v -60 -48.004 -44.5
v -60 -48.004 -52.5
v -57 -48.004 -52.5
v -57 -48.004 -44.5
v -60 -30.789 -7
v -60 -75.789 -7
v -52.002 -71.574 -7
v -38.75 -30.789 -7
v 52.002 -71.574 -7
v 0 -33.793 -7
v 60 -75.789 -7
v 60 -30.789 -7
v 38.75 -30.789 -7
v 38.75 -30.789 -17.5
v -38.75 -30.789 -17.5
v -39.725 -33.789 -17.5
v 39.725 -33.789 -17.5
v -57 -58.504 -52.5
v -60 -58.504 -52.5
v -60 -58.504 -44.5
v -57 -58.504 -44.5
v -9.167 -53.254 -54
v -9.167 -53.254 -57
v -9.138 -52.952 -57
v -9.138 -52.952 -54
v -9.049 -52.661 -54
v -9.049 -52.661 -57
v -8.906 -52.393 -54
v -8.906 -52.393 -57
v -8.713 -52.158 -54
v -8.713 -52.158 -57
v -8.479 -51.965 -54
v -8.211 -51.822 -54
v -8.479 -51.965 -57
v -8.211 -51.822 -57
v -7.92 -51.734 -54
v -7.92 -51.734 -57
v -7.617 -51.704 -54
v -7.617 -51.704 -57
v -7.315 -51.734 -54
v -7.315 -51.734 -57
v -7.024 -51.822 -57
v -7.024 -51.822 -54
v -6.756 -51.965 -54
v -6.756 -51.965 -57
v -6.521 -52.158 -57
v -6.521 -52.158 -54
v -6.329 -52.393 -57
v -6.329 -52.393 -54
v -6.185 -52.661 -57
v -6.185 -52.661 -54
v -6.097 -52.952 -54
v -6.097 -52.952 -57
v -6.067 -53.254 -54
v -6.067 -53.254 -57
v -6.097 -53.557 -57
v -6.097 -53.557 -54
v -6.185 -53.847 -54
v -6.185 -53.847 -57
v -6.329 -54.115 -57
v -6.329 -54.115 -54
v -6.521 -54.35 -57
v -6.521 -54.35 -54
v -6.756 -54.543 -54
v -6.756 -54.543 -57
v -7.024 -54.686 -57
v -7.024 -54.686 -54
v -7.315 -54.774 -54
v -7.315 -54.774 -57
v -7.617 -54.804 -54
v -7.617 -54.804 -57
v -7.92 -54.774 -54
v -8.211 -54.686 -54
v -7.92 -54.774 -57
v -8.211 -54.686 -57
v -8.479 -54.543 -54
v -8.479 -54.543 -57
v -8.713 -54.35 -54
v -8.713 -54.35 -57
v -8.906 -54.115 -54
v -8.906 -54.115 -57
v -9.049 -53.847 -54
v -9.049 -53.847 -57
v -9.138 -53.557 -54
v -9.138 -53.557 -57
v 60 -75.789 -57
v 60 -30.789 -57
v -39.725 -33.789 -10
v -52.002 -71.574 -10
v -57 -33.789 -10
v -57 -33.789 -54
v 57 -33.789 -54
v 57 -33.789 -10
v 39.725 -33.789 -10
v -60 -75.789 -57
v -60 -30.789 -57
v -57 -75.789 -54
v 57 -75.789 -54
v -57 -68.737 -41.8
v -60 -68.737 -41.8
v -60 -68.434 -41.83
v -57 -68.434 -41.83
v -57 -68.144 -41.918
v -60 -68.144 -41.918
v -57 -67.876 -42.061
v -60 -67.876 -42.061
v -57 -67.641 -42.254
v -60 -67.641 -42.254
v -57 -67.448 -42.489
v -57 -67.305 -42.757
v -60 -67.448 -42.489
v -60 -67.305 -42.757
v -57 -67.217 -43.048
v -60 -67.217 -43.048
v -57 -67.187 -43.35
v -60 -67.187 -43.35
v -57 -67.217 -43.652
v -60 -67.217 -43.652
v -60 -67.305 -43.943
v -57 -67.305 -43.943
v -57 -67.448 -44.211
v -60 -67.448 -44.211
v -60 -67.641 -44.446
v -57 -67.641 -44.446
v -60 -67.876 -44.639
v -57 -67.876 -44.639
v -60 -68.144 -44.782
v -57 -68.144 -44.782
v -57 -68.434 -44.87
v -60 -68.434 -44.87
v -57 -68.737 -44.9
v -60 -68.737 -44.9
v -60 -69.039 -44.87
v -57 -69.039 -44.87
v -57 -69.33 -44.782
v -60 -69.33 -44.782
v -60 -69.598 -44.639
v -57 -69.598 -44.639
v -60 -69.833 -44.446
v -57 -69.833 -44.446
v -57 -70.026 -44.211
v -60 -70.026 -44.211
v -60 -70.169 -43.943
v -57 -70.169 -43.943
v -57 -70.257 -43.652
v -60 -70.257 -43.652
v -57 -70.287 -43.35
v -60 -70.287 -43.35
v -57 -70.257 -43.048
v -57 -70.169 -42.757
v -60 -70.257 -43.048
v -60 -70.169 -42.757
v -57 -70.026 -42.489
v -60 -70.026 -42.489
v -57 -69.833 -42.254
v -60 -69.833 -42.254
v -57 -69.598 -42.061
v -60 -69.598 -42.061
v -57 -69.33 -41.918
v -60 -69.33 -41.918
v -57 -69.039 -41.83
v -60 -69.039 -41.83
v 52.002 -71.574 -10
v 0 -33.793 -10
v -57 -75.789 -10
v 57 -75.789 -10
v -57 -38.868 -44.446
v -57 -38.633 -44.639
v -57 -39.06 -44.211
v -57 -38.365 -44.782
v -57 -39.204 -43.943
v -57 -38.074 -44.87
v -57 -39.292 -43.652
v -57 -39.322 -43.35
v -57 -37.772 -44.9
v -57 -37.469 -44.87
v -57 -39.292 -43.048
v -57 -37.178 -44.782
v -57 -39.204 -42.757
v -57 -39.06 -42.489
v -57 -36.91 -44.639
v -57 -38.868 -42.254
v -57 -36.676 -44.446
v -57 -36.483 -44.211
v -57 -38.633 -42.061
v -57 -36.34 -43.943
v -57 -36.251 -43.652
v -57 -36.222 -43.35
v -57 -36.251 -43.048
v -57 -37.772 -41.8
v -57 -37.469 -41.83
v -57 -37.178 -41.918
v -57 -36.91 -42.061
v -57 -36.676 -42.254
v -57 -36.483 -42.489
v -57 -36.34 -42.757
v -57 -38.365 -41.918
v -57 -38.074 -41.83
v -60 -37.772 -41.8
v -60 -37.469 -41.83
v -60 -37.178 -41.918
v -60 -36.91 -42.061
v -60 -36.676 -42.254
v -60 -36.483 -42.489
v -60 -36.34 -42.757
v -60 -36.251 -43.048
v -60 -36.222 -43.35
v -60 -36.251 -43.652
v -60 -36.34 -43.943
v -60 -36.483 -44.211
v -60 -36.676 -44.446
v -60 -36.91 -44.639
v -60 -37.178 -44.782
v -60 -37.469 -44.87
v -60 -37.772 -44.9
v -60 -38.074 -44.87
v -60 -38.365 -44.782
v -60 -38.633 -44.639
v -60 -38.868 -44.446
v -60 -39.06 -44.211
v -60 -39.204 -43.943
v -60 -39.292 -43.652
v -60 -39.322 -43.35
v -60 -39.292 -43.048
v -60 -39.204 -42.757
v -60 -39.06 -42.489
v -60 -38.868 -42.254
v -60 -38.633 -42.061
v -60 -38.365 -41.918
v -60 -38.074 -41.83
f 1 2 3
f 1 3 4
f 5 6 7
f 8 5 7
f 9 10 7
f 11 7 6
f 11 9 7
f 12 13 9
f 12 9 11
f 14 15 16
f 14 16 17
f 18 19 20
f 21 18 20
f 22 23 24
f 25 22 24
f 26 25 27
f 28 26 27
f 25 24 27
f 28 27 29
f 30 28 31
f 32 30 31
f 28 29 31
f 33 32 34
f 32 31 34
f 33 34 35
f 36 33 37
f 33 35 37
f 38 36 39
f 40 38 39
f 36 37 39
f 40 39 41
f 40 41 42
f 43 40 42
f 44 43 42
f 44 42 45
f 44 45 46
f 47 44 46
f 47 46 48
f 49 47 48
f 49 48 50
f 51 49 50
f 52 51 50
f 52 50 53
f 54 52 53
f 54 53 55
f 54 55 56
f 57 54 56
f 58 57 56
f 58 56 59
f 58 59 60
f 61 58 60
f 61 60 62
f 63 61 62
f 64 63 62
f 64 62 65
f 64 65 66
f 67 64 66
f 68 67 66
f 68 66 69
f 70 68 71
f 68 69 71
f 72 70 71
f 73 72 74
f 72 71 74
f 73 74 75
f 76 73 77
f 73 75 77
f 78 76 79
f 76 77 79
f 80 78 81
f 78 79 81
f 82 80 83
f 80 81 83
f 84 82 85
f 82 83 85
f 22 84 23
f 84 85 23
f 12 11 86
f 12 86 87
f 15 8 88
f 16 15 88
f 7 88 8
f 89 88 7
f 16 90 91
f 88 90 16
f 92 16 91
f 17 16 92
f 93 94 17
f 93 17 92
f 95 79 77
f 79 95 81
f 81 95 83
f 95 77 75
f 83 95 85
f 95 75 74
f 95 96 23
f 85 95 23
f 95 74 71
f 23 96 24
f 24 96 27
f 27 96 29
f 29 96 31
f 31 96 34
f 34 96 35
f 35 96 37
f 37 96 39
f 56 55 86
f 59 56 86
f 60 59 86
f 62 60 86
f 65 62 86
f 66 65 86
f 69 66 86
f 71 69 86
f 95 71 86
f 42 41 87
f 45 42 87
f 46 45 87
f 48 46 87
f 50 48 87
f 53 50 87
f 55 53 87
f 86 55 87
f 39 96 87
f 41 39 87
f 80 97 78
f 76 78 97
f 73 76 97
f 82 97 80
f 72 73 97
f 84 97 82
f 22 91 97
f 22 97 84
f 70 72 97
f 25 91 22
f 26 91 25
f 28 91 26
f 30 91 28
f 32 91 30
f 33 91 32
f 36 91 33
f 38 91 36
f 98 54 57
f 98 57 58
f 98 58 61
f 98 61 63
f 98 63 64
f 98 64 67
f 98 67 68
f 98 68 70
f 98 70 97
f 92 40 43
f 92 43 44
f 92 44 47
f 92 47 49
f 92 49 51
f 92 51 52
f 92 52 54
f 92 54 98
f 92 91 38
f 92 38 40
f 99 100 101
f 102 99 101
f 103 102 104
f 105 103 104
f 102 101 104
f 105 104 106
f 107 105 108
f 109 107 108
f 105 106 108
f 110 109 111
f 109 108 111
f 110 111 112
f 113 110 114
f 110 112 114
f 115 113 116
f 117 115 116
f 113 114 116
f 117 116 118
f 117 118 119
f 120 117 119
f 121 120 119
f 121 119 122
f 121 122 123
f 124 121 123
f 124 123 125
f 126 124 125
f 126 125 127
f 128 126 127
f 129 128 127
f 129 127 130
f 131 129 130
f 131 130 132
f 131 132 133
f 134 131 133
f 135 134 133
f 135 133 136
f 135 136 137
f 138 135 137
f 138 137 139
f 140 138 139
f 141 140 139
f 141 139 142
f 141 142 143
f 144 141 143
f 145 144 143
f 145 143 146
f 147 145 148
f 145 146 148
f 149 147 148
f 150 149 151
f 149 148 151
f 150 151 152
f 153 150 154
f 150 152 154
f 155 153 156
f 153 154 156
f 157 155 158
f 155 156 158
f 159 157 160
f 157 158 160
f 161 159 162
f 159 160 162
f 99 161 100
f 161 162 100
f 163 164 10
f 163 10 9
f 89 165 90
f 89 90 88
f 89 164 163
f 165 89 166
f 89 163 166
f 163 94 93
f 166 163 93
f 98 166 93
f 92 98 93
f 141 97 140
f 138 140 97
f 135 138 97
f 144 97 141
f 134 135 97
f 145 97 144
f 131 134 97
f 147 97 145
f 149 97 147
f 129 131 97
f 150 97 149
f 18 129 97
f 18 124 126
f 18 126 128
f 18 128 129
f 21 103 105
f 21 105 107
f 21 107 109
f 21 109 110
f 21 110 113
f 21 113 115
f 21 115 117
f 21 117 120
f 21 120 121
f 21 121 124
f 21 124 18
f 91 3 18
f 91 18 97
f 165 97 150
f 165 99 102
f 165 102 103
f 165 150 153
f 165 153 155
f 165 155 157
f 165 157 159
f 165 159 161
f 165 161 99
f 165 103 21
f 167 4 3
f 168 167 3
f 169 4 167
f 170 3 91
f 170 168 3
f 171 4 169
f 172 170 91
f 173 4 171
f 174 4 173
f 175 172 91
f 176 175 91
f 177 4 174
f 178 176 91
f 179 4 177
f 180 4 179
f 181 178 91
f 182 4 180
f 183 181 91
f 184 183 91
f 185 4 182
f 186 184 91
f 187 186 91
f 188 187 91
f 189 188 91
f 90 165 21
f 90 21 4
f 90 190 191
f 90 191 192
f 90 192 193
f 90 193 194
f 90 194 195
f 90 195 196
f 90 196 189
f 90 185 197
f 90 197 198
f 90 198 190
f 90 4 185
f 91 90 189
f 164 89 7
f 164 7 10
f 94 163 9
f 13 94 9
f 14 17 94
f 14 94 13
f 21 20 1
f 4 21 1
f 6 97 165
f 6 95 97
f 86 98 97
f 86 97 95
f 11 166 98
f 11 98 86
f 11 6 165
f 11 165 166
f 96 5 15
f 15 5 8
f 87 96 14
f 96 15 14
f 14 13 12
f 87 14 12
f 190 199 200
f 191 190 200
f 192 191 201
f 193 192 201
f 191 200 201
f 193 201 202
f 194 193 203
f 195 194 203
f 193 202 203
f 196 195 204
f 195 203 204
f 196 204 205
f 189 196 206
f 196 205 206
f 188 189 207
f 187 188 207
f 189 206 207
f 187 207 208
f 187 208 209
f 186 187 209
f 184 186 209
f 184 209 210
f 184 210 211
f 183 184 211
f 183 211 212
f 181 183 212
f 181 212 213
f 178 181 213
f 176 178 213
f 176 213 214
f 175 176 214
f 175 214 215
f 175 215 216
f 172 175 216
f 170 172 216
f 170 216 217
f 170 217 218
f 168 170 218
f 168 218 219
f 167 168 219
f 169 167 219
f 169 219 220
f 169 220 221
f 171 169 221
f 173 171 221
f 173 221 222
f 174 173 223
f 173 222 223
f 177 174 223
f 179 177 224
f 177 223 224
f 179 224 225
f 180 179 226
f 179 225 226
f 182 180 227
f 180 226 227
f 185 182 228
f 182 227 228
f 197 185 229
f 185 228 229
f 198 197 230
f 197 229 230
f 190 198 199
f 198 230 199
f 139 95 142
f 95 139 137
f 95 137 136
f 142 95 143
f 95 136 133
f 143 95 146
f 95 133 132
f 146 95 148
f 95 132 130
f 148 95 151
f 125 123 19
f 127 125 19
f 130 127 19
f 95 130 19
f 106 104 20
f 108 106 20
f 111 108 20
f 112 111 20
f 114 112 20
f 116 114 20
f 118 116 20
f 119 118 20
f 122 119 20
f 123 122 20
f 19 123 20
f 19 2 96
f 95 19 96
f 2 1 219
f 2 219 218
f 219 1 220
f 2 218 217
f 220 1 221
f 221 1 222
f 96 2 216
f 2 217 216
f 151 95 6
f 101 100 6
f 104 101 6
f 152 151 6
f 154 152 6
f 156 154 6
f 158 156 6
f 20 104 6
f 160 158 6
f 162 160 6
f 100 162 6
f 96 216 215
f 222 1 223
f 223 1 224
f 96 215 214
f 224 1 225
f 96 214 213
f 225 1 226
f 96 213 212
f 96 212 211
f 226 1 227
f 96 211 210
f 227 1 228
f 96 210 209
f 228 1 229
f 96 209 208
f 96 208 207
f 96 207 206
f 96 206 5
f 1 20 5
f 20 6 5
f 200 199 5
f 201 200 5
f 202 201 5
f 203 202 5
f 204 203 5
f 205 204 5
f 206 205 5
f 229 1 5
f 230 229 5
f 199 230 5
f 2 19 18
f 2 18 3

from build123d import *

# Parameters (mm, degrees)
CROQUIS2_W                   = 120
CROQUIS2_H                   = 45
SALIENTE_EXTRUIR1_DEPTH      = 5
SALIENTE_EXTRUIR1_DEPTH_BACK = 45
VACIADO1_T                   = -3
CORTAR_EXTRUIR2_START        = -10.5
CORTAR_EXTRUIR2_DEPTH        = 10.5
CORTAR_EXTRUIR3_REACH        = 122
CROQUIS4_R                   = 1.55
CROQUIS4_W                   = 8
CROQUIS4_H                   = 10.5
CORTAR_EXTRUIR4_REACH        = 52
CROQUIS5_R                   = 1.55


with BuildPart() as part:
    # Croquis2 → Saliente-Extruir1 (new body, two sides)
    with BuildSketch(Plane.XY.offset(-12)) as saliente_extruir1_sk:
        with Locations((0, -53.288987008)):
            Rectangle(CROQUIS2_W, CROQUIS2_H)
    extrude(amount=SALIENTE_EXTRUIR1_DEPTH)
    extrude(saliente_extruir1_sk.sketch, amount=-SALIENTE_EXTRUIR1_DEPTH_BACK)

    # Vaciado1
    vaciado1_openings = [part.faces().sort_by_distance(p)[0] for p in [
        (0, -75.788987008, -32),
    ]]
    offset(amount=VACIADO1_T, openings=vaciado1_openings, kind=Kind.INTERSECTION)

    # Croquis3 → Cortar-Extruir2 (cut)
    with BuildSketch(Plane.XY.offset(-7).offset(CORTAR_EXTRUIR2_START)):
        Polygon((0, 88.470820393), (-19.862936734, 27.338987008), (-84.140750237, 27.338987008), (-32.138906752, -10.442563819), (-52.001843485, -71.574397204), (0, -33.792846378), (52.001843485, -71.574397204), (32.138906752, -10.442563819), (84.140750237, 27.338987008), (19.862936734, 27.338987008), align=None)
    extrude(amount=CORTAR_EXTRUIR2_DEPTH, mode=Mode.SUBTRACT)

    # Croquis4 → Cortar-Extruir3 (cut, up to next)
    with BuildSketch(Plane.ZY.offset(60), mode=Mode.PRIVATE) as cortar_extruir3_sk1:
        with Locations((-43.35, -37.771593165)):
            Circle(CROQUIS4_R)
    cortar_extruir3_tool1 = extrude(cortar_extruir3_sk1.sketch, amount=-CORTAR_EXTRUIR3_REACH, mode=Mode.PRIVATE) & part.part
    add(cortar_extruir3_tool1.solids().sort_by_distance((-60, -37.771593, -43.35))[0], mode=Mode.SUBTRACT)
    # Croquis4 → Cortar-Extruir3 (cut, up to next)
    with BuildSketch(Plane.ZY.offset(60), mode=Mode.PRIVATE) as cortar_extruir3_sk2:
        with Locations((-43.35, -68.73680548)):
            Circle(CROQUIS4_R)
    cortar_extruir3_tool2 = extrude(cortar_extruir3_sk2.sketch, amount=-CORTAR_EXTRUIR3_REACH, mode=Mode.PRIVATE) & part.part
    add(cortar_extruir3_tool2.solids().sort_by_distance((-60, -68.736805, -43.35))[0], mode=Mode.SUBTRACT)
    # Croquis4 → Cortar-Extruir3 (cut, up to next)
    with BuildSketch(Plane.ZY.offset(60), mode=Mode.PRIVATE) as cortar_extruir3_sk3:
        with Locations((-48.5, -53.254199323)):
            Rectangle(CROQUIS4_W, CROQUIS4_H)
    cortar_extruir3_tool3 = extrude(cortar_extruir3_sk3.sketch, amount=-CORTAR_EXTRUIR3_REACH, mode=Mode.PRIVATE) & part.part
    add(cortar_extruir3_tool3.solids().sort_by_distance((-60, -53.254199, -48.5))[0], mode=Mode.SUBTRACT)

    # Croquis5 → Cortar-Extruir4 (cut, up to next)
    with BuildSketch(Plane(origin=(0, 0, -57), x_dir=(-1, 0, 0), z_dir=(0, 0, -1)), mode=Mode.PRIVATE) as cortar_extruir4_sk1:
        with Locations((7.617393842, -53.254199323)):
            Circle(CROQUIS5_R)
    cortar_extruir4_tool1 = extrude(cortar_extruir4_sk1.sketch, amount=-CORTAR_EXTRUIR4_REACH, mode=Mode.PRIVATE) & part.part
    add(cortar_extruir4_tool1.solids().sort_by_distance((-7.617394, -53.254199, -57))[0], mode=Mode.SUBTRACT)


solid = part.part
